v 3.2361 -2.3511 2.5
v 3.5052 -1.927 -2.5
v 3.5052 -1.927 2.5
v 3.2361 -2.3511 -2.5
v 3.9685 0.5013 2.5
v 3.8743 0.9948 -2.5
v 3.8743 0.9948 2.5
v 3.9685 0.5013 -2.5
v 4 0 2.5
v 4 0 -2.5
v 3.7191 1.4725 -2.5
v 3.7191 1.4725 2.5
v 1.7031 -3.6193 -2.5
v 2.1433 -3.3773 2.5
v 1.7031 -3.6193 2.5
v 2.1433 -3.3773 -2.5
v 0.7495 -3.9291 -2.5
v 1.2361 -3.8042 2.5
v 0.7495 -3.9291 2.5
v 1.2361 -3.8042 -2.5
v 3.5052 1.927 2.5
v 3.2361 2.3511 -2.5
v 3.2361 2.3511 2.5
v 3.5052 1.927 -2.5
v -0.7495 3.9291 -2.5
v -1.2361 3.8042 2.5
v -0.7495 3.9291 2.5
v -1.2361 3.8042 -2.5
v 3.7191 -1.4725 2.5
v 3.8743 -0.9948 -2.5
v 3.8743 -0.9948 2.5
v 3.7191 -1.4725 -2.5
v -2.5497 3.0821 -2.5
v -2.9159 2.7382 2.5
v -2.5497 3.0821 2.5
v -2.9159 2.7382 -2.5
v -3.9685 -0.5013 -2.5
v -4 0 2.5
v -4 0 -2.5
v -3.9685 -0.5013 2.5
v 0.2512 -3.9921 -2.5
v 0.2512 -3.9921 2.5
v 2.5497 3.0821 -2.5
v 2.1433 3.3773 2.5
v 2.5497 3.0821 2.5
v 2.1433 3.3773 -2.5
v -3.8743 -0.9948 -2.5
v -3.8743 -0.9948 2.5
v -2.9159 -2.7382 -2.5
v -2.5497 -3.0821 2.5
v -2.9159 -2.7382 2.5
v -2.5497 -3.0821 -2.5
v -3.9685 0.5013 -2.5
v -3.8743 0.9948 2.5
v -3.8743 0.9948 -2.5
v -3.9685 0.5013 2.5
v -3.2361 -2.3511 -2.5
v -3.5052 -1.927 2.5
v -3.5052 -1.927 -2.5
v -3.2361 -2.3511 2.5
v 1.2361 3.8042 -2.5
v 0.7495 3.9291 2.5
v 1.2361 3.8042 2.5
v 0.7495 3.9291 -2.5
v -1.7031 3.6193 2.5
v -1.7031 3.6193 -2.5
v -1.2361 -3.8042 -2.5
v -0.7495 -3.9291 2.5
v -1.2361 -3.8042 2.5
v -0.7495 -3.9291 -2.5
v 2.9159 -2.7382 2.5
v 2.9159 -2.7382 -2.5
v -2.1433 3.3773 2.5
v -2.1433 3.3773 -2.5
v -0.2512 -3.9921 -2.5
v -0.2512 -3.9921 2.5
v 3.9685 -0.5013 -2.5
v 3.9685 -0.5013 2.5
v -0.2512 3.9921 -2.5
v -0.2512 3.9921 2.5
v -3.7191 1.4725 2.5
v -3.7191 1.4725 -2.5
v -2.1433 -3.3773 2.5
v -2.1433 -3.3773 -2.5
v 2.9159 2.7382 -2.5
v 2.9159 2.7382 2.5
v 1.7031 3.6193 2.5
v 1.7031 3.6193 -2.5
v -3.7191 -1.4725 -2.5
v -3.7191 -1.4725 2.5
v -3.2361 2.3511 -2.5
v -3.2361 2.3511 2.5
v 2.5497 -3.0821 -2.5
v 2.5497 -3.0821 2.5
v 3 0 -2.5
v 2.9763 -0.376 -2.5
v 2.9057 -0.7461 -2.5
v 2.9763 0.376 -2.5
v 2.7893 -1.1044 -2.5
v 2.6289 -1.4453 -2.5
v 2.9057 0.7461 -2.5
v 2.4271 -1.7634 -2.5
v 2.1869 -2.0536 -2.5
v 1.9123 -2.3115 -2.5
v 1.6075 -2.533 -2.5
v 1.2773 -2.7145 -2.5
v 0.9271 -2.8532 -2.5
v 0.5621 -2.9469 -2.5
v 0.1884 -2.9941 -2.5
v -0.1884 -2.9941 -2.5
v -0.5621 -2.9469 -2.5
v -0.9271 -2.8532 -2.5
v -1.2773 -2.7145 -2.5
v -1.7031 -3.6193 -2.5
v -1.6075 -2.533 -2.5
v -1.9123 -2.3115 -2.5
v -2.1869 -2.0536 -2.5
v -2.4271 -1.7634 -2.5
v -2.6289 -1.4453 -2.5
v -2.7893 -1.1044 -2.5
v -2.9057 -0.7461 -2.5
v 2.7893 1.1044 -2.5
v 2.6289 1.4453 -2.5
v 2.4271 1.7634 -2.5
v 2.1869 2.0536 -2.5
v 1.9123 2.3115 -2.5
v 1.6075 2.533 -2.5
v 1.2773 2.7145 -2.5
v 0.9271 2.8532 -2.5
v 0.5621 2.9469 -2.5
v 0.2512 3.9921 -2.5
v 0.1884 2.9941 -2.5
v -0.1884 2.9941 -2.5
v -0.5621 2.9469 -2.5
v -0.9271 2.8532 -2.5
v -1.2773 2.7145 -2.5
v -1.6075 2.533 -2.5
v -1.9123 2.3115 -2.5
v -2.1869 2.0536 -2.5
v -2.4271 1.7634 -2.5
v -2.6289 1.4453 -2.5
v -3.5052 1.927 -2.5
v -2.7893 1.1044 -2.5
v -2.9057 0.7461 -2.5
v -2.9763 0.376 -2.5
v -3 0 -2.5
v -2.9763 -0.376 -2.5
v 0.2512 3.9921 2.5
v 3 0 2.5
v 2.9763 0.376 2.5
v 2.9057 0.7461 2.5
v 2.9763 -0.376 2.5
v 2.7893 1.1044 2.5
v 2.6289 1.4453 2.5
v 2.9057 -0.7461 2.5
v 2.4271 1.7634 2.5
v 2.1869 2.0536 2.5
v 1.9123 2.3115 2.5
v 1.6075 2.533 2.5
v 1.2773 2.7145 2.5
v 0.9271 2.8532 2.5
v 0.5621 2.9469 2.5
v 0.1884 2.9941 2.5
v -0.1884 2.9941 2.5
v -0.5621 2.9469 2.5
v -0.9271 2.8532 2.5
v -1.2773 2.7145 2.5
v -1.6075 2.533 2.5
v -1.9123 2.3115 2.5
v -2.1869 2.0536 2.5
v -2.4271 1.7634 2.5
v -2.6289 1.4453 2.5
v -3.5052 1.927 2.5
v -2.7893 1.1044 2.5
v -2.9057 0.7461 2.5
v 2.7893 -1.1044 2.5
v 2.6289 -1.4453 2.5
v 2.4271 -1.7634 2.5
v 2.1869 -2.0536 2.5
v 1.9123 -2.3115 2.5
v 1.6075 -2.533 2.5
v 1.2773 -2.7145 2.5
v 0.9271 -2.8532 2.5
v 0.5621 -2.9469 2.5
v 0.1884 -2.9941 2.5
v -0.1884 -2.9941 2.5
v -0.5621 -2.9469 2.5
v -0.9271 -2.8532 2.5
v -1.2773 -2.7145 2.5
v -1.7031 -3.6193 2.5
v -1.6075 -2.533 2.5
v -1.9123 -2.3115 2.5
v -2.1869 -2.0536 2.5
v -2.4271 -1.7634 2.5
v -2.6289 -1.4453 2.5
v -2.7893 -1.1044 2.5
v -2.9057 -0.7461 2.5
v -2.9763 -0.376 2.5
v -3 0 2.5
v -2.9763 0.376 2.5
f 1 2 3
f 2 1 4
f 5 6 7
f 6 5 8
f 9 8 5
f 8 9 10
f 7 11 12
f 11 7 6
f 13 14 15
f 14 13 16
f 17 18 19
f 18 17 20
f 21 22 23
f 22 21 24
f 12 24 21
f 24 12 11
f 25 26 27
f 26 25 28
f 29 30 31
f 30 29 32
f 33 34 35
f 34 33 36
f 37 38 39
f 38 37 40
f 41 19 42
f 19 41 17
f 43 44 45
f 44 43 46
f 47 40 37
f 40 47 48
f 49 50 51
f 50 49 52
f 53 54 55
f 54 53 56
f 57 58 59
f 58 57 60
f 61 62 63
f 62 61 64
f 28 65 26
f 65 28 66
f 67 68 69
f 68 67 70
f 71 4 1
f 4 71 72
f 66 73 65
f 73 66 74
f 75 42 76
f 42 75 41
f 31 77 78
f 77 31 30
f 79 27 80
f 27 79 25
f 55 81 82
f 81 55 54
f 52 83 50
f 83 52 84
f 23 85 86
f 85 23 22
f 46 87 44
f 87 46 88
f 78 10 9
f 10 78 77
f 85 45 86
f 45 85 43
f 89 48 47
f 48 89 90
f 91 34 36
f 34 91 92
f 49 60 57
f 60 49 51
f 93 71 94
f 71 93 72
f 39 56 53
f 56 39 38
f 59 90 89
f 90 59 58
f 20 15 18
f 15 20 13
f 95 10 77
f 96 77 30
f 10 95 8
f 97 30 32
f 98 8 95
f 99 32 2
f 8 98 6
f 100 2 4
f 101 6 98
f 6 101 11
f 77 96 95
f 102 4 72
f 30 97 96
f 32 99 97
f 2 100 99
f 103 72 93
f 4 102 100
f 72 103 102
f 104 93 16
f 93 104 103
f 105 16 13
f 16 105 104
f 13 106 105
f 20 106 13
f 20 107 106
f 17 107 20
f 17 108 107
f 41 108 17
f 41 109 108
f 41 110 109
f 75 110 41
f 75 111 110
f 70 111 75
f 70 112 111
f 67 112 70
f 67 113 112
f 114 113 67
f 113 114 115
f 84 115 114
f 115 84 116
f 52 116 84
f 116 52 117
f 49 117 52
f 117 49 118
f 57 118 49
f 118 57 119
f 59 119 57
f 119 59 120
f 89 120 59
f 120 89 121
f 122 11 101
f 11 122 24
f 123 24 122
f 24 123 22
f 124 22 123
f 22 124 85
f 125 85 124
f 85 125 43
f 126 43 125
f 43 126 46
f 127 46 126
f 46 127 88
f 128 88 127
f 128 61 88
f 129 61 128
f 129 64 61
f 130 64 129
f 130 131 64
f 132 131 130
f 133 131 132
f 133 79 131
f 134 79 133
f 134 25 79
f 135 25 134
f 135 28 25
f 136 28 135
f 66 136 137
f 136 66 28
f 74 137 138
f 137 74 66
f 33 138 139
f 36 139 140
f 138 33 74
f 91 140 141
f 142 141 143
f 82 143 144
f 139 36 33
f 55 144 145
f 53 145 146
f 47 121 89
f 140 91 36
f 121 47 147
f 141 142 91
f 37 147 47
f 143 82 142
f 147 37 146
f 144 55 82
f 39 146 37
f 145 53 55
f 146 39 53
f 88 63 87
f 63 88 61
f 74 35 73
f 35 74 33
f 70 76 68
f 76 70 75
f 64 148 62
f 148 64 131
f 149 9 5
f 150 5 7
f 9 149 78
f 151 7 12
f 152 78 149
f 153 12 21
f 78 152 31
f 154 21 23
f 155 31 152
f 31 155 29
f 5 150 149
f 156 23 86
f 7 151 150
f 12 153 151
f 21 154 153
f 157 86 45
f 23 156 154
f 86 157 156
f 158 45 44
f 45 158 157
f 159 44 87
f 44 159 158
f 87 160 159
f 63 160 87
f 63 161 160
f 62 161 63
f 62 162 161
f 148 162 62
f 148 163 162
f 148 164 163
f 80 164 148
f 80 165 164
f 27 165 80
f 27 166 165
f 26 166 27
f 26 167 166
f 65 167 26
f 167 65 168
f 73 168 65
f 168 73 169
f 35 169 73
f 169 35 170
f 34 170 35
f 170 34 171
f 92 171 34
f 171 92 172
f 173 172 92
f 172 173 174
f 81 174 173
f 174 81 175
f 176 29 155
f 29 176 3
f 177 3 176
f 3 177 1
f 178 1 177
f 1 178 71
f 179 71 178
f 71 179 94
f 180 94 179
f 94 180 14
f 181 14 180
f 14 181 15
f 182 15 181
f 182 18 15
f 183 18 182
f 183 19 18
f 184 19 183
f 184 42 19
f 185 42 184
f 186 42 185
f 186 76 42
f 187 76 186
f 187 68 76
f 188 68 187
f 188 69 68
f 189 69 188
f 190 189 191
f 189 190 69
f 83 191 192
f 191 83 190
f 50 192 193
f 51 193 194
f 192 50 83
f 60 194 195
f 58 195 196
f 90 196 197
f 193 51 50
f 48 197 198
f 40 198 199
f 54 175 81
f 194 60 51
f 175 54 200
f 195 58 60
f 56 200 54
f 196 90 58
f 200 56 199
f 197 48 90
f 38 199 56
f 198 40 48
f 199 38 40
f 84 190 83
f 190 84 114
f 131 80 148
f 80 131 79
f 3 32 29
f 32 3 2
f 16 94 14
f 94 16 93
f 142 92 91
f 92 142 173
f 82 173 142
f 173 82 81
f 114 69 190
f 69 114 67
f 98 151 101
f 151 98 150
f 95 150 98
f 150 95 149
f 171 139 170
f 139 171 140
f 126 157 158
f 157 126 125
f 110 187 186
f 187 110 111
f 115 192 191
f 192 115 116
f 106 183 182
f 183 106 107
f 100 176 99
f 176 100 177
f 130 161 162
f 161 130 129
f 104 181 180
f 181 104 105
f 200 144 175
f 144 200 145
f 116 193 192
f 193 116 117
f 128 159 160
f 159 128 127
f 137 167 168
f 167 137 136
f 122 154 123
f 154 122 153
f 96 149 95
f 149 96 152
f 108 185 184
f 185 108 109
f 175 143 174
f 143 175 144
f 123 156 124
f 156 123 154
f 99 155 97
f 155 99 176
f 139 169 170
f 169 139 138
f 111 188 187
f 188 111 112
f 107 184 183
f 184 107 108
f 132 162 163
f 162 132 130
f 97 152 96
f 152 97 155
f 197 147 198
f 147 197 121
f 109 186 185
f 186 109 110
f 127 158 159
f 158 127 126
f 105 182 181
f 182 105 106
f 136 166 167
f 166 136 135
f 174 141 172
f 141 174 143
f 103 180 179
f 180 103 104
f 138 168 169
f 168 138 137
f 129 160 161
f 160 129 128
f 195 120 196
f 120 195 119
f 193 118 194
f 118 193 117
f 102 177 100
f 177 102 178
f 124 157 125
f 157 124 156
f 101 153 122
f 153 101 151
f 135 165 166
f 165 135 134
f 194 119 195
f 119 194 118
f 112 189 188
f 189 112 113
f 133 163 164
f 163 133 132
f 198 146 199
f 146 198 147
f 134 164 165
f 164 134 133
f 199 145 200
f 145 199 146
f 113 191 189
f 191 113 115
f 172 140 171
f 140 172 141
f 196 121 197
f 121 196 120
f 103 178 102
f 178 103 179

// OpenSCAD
$fn = 50;


difference() {
	union() {
		translate(v = [0, 0, -2.5000000000]) {
			cylinder(h = 5, r = 4.0000000000);
		}
	}
	union() {
		translate(v = [0, 0, -100.0000000000]) {
			cylinder(h = 200, r = 3.0000000000);
		}
	}
}
